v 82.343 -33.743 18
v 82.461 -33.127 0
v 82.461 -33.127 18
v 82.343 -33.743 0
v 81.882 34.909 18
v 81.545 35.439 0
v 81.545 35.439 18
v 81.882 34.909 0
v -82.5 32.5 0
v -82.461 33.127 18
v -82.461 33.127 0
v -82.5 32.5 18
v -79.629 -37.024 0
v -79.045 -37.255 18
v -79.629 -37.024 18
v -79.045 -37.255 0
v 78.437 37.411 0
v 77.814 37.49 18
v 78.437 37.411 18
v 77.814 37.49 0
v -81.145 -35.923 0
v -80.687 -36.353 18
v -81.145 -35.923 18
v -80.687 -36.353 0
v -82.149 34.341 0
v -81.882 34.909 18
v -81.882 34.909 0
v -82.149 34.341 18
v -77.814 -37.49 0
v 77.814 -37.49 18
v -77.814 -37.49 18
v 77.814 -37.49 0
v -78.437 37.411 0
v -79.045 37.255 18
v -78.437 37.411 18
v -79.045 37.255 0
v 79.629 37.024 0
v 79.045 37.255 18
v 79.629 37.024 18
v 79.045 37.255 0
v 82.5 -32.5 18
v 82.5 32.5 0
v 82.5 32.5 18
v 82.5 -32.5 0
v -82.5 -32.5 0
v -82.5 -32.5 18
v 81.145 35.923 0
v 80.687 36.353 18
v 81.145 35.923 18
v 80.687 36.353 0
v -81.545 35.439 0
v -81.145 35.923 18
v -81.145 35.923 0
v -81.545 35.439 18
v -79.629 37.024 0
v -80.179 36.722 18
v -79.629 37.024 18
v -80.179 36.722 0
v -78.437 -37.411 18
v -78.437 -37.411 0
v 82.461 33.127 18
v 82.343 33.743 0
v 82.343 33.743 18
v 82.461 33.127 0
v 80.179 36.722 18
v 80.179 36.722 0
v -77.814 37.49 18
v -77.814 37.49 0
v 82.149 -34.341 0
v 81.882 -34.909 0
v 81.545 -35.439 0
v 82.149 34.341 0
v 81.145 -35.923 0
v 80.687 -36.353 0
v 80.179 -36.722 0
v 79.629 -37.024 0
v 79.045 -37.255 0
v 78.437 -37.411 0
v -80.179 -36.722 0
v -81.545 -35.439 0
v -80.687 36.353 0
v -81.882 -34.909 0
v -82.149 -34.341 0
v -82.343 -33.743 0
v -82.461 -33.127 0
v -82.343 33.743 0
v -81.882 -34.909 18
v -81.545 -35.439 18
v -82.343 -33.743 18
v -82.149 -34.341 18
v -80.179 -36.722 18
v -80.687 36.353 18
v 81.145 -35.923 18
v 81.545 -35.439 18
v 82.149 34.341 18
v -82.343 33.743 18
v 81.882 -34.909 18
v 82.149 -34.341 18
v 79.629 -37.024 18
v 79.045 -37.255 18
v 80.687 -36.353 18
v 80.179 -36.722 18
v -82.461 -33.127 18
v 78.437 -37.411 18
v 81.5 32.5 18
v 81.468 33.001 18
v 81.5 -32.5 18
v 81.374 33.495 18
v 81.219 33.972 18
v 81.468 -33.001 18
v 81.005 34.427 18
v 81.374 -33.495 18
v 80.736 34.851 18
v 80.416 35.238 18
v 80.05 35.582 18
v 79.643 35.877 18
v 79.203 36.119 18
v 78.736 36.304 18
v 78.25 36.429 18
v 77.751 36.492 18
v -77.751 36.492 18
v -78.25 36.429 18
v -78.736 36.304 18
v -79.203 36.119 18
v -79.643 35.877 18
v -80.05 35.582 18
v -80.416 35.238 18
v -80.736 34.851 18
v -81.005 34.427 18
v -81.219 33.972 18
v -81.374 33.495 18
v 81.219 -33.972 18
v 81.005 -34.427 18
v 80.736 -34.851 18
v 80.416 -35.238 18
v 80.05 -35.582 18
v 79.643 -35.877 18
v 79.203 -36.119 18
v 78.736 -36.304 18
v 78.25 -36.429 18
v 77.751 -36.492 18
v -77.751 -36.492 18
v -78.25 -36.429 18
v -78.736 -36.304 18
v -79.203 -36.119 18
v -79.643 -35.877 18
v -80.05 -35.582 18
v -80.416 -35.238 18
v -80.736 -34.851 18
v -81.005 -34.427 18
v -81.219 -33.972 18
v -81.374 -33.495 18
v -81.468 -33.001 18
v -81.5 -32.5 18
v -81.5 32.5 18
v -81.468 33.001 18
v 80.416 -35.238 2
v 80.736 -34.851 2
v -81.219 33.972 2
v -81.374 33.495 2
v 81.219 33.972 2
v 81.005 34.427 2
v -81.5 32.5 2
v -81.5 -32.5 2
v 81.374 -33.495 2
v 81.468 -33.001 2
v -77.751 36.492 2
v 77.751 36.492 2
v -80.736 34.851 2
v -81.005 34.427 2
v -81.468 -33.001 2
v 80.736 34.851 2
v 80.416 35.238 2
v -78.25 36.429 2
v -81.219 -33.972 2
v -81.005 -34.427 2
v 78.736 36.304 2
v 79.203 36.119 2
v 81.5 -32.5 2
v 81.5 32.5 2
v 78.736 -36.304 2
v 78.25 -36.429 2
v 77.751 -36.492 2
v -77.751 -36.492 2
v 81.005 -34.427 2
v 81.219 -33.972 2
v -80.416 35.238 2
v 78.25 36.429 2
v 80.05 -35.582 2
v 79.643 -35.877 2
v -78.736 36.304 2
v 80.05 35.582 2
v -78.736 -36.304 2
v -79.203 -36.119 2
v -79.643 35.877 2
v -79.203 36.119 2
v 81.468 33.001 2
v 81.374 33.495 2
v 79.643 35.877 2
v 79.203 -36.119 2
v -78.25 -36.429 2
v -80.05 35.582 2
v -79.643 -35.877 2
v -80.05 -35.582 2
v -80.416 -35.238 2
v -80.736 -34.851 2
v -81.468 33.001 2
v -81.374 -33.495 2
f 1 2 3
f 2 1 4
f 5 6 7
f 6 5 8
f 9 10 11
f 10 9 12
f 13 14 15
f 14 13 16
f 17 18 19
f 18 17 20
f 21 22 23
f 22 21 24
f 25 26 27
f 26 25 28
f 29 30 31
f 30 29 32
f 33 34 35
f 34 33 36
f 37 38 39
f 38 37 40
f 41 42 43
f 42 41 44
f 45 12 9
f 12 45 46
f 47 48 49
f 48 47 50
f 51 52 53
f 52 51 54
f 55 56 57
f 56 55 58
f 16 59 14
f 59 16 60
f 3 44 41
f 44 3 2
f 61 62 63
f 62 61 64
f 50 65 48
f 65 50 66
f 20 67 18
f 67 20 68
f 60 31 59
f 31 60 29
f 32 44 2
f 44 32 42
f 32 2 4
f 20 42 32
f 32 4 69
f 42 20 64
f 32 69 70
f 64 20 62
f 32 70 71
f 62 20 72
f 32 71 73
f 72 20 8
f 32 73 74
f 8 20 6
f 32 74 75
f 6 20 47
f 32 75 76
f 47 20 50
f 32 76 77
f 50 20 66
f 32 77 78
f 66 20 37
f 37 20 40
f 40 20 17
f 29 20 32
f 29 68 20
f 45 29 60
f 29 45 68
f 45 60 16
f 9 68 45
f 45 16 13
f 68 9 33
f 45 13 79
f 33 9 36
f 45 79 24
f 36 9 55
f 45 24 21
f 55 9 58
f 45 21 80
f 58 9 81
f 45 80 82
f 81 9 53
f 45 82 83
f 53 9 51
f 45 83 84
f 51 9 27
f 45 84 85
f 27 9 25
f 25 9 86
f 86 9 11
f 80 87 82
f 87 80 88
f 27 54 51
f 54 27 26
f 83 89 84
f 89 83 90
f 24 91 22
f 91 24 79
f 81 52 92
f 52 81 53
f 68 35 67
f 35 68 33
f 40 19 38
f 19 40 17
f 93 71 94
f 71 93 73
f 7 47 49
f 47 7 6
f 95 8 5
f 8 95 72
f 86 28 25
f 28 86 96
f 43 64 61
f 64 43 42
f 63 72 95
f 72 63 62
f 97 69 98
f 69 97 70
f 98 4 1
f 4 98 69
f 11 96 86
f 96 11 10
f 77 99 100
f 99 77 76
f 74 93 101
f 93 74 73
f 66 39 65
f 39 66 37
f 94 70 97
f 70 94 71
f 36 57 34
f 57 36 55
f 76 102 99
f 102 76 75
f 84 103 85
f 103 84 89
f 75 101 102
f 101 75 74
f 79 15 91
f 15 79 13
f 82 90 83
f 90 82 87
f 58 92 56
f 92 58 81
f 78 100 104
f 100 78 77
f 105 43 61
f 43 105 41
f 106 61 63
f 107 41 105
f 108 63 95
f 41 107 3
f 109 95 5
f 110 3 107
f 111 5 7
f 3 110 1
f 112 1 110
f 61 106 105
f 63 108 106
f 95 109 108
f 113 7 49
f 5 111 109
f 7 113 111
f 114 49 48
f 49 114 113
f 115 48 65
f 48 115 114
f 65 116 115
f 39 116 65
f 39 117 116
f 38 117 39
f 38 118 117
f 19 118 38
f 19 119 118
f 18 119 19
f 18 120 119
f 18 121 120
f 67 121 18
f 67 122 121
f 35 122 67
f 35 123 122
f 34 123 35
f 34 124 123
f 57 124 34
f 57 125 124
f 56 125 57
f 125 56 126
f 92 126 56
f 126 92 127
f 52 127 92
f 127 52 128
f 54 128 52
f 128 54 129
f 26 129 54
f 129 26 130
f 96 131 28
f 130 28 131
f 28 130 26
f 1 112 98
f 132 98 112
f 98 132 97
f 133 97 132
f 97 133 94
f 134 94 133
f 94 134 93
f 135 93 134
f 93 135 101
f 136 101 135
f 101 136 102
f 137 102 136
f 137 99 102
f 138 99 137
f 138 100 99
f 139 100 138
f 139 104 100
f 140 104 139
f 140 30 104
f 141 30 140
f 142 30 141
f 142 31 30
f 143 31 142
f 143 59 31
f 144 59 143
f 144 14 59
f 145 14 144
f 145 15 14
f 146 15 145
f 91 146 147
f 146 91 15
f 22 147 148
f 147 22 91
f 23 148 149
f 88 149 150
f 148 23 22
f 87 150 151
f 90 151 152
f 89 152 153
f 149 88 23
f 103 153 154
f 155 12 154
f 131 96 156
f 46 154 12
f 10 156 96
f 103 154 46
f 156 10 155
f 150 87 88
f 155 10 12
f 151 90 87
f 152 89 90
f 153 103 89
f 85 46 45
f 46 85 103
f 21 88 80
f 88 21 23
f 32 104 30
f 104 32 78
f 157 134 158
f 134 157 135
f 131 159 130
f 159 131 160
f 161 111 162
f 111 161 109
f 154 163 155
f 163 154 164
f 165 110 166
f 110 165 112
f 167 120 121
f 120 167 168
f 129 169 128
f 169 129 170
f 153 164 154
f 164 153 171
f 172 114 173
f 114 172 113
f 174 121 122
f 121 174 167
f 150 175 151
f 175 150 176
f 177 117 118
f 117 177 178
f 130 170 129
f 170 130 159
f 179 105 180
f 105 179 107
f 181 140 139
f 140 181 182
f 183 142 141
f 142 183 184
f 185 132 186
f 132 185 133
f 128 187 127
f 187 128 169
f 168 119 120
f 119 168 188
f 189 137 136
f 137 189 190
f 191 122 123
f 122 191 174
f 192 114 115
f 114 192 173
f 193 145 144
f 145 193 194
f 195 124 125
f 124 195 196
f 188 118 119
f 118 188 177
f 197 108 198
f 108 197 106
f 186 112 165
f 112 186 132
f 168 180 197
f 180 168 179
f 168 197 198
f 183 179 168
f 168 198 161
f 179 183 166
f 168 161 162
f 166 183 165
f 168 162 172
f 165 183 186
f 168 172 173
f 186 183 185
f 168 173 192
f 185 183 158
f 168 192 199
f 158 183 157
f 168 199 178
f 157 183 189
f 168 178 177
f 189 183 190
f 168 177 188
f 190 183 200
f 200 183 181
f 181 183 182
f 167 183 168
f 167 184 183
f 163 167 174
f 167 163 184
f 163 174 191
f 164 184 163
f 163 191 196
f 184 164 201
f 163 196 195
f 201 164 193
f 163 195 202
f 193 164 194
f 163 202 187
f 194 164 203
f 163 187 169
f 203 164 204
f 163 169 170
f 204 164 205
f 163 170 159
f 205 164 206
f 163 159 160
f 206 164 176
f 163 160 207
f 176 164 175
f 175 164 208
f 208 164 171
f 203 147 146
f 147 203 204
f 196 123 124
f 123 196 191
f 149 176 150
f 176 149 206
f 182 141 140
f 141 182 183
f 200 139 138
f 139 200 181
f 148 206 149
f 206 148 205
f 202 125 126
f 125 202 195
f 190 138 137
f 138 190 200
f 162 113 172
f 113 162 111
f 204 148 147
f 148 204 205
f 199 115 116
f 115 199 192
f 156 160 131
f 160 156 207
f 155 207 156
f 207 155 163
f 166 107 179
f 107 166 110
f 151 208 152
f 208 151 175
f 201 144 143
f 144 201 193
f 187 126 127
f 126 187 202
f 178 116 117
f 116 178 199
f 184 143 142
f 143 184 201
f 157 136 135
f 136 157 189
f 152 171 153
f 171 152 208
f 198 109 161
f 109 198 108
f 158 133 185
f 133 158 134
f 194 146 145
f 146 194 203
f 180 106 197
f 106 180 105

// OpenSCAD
$fn = 50;


difference() {
	union() {
		hull() {
			translate(v = [-77.5000000000, 32.5000000000, 0]) {
				cylinder(h = 18, r = 5);
			}
			translate(v = [77.5000000000, 32.5000000000, 0]) {
				cylinder(h = 18, r = 5);
			}
			translate(v = [-77.5000000000, -32.5000000000, 0]) {
				cylinder(h = 18, r = 5);
			}
			translate(v = [77.5000000000, -32.5000000000, 0]) {
				cylinder(h = 18, r = 5);
			}
		}
	}
	union() {
		translate(v = [0, 0, 2]) {
			hull() {
				translate(v = [-77.5000000000, 32.5000000000, 0]) {
					cylinder(h = 16, r = 4);
				}
				translate(v = [77.5000000000, 32.5000000000, 0]) {
					cylinder(h = 16, r = 4);
				}
				translate(v = [-77.5000000000, -32.5000000000, 0]) {
					cylinder(h = 16, r = 4);
				}
				translate(v = [77.5000000000, -32.5000000000, 0]) {
					cylinder(h = 16, r = 4);
				}
			}
		}
	}
}
